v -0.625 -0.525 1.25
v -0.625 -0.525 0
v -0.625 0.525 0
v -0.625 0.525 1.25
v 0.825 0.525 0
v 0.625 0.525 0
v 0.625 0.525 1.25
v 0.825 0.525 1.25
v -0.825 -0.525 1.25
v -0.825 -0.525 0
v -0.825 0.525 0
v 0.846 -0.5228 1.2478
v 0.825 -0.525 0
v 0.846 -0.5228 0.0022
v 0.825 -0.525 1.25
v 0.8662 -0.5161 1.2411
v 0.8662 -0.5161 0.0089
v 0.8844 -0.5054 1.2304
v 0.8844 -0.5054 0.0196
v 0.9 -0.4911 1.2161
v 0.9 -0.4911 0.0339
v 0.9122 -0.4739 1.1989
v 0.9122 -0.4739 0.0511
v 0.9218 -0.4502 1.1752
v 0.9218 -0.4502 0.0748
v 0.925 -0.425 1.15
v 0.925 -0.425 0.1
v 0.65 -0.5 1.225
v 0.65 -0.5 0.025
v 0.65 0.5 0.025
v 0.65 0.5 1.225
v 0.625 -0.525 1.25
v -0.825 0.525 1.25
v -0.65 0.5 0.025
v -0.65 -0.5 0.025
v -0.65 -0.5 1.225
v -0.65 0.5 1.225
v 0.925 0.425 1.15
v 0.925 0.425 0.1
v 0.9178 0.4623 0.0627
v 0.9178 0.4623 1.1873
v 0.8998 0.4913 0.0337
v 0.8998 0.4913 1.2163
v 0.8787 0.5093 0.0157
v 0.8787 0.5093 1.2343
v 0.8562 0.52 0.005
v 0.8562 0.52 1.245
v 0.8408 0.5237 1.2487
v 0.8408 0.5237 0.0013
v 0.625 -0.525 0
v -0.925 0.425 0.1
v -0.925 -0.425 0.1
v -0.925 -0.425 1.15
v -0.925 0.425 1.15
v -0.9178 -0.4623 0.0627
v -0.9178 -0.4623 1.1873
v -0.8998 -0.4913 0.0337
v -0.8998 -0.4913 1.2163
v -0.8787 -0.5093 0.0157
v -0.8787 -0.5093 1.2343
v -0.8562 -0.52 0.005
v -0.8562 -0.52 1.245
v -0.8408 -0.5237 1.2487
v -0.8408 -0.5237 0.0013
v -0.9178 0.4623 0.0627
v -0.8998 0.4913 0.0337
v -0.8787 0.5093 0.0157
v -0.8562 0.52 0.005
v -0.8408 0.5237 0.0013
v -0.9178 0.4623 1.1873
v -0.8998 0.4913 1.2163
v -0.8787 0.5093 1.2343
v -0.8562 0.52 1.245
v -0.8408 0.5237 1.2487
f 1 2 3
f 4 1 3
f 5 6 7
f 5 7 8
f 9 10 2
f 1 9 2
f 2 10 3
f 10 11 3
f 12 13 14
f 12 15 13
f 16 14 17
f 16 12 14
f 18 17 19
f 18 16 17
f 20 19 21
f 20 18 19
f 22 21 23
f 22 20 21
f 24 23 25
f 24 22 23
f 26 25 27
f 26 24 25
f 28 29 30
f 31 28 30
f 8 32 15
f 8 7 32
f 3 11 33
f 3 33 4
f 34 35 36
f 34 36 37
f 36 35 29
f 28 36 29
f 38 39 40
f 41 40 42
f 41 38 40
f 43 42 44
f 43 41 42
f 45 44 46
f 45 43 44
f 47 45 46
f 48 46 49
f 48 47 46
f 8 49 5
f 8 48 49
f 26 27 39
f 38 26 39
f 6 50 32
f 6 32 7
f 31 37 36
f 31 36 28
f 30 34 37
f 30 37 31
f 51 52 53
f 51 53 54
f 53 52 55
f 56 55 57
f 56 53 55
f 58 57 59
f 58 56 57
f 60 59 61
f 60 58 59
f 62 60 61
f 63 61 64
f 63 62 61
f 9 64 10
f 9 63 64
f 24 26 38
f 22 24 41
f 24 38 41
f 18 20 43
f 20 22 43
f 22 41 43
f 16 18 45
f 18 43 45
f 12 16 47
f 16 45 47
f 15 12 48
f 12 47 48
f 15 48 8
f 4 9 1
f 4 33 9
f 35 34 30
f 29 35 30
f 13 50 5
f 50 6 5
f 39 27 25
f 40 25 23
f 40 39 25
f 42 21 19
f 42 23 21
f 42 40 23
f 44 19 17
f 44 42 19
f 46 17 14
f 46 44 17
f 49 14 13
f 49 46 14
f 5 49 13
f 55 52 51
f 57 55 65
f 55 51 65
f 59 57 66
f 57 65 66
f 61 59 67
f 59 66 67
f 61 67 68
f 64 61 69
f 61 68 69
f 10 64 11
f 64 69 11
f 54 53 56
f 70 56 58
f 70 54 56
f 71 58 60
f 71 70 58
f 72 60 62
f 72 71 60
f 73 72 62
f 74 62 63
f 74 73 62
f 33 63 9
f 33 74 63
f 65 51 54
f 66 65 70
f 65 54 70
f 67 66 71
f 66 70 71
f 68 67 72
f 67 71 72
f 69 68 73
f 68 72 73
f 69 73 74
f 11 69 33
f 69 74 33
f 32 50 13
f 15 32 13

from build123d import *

# Parameters (mm, degrees)
SKETCH001_W      = 1.3
SKETCH001_H      = 1
EXTRUDE001_DEPTH = 1.2
SKETCH_W         = 0.3
SKETCH_H         = 1.05
EXTRUDE_DEPTH    = 1.25
FILLET_R         = 0.1


with BuildPart() as body_extr:
    # Sketch001 → Extrude001 (new body)
    with BuildSketch(Plane.XY.offset(0.025)):
        Rectangle(SKETCH001_W, SKETCH001_H)
    extrude(amount=EXTRUDE001_DEPTH)


with BuildPart() as fillet_body:
    # Sketch → Extrude (new body)
    with BuildSketch(Plane.XY):
        with Locations((-0.775, 0)):
            Rectangle(SKETCH_W, SKETCH_H)
        with Locations((0.775, 0)):
            Rectangle(SKETCH_W, SKETCH_H)
    extrude(amount=EXTRUDE_DEPTH)

    # Fillet
    fillet_edges = [fillet_body.edges().sort_by_distance(p)[0] for p in [
        (0.925, 0.525, 0.625),
        (0.925, -0.525, 0.625),
        (0.925, 0, 0),
        (0.925, 0, 1.25),
        (-0.925, 0.525, 0.625),
        (-0.925, -0.525, 0.625),
        (-0.925, 0, 0),
        (-0.925, 0, 1.25),
    ]]
    fillet(fillet_edges, radius=FILLET_R)


solid = Compound([body_extr.part, fillet_body.part])
